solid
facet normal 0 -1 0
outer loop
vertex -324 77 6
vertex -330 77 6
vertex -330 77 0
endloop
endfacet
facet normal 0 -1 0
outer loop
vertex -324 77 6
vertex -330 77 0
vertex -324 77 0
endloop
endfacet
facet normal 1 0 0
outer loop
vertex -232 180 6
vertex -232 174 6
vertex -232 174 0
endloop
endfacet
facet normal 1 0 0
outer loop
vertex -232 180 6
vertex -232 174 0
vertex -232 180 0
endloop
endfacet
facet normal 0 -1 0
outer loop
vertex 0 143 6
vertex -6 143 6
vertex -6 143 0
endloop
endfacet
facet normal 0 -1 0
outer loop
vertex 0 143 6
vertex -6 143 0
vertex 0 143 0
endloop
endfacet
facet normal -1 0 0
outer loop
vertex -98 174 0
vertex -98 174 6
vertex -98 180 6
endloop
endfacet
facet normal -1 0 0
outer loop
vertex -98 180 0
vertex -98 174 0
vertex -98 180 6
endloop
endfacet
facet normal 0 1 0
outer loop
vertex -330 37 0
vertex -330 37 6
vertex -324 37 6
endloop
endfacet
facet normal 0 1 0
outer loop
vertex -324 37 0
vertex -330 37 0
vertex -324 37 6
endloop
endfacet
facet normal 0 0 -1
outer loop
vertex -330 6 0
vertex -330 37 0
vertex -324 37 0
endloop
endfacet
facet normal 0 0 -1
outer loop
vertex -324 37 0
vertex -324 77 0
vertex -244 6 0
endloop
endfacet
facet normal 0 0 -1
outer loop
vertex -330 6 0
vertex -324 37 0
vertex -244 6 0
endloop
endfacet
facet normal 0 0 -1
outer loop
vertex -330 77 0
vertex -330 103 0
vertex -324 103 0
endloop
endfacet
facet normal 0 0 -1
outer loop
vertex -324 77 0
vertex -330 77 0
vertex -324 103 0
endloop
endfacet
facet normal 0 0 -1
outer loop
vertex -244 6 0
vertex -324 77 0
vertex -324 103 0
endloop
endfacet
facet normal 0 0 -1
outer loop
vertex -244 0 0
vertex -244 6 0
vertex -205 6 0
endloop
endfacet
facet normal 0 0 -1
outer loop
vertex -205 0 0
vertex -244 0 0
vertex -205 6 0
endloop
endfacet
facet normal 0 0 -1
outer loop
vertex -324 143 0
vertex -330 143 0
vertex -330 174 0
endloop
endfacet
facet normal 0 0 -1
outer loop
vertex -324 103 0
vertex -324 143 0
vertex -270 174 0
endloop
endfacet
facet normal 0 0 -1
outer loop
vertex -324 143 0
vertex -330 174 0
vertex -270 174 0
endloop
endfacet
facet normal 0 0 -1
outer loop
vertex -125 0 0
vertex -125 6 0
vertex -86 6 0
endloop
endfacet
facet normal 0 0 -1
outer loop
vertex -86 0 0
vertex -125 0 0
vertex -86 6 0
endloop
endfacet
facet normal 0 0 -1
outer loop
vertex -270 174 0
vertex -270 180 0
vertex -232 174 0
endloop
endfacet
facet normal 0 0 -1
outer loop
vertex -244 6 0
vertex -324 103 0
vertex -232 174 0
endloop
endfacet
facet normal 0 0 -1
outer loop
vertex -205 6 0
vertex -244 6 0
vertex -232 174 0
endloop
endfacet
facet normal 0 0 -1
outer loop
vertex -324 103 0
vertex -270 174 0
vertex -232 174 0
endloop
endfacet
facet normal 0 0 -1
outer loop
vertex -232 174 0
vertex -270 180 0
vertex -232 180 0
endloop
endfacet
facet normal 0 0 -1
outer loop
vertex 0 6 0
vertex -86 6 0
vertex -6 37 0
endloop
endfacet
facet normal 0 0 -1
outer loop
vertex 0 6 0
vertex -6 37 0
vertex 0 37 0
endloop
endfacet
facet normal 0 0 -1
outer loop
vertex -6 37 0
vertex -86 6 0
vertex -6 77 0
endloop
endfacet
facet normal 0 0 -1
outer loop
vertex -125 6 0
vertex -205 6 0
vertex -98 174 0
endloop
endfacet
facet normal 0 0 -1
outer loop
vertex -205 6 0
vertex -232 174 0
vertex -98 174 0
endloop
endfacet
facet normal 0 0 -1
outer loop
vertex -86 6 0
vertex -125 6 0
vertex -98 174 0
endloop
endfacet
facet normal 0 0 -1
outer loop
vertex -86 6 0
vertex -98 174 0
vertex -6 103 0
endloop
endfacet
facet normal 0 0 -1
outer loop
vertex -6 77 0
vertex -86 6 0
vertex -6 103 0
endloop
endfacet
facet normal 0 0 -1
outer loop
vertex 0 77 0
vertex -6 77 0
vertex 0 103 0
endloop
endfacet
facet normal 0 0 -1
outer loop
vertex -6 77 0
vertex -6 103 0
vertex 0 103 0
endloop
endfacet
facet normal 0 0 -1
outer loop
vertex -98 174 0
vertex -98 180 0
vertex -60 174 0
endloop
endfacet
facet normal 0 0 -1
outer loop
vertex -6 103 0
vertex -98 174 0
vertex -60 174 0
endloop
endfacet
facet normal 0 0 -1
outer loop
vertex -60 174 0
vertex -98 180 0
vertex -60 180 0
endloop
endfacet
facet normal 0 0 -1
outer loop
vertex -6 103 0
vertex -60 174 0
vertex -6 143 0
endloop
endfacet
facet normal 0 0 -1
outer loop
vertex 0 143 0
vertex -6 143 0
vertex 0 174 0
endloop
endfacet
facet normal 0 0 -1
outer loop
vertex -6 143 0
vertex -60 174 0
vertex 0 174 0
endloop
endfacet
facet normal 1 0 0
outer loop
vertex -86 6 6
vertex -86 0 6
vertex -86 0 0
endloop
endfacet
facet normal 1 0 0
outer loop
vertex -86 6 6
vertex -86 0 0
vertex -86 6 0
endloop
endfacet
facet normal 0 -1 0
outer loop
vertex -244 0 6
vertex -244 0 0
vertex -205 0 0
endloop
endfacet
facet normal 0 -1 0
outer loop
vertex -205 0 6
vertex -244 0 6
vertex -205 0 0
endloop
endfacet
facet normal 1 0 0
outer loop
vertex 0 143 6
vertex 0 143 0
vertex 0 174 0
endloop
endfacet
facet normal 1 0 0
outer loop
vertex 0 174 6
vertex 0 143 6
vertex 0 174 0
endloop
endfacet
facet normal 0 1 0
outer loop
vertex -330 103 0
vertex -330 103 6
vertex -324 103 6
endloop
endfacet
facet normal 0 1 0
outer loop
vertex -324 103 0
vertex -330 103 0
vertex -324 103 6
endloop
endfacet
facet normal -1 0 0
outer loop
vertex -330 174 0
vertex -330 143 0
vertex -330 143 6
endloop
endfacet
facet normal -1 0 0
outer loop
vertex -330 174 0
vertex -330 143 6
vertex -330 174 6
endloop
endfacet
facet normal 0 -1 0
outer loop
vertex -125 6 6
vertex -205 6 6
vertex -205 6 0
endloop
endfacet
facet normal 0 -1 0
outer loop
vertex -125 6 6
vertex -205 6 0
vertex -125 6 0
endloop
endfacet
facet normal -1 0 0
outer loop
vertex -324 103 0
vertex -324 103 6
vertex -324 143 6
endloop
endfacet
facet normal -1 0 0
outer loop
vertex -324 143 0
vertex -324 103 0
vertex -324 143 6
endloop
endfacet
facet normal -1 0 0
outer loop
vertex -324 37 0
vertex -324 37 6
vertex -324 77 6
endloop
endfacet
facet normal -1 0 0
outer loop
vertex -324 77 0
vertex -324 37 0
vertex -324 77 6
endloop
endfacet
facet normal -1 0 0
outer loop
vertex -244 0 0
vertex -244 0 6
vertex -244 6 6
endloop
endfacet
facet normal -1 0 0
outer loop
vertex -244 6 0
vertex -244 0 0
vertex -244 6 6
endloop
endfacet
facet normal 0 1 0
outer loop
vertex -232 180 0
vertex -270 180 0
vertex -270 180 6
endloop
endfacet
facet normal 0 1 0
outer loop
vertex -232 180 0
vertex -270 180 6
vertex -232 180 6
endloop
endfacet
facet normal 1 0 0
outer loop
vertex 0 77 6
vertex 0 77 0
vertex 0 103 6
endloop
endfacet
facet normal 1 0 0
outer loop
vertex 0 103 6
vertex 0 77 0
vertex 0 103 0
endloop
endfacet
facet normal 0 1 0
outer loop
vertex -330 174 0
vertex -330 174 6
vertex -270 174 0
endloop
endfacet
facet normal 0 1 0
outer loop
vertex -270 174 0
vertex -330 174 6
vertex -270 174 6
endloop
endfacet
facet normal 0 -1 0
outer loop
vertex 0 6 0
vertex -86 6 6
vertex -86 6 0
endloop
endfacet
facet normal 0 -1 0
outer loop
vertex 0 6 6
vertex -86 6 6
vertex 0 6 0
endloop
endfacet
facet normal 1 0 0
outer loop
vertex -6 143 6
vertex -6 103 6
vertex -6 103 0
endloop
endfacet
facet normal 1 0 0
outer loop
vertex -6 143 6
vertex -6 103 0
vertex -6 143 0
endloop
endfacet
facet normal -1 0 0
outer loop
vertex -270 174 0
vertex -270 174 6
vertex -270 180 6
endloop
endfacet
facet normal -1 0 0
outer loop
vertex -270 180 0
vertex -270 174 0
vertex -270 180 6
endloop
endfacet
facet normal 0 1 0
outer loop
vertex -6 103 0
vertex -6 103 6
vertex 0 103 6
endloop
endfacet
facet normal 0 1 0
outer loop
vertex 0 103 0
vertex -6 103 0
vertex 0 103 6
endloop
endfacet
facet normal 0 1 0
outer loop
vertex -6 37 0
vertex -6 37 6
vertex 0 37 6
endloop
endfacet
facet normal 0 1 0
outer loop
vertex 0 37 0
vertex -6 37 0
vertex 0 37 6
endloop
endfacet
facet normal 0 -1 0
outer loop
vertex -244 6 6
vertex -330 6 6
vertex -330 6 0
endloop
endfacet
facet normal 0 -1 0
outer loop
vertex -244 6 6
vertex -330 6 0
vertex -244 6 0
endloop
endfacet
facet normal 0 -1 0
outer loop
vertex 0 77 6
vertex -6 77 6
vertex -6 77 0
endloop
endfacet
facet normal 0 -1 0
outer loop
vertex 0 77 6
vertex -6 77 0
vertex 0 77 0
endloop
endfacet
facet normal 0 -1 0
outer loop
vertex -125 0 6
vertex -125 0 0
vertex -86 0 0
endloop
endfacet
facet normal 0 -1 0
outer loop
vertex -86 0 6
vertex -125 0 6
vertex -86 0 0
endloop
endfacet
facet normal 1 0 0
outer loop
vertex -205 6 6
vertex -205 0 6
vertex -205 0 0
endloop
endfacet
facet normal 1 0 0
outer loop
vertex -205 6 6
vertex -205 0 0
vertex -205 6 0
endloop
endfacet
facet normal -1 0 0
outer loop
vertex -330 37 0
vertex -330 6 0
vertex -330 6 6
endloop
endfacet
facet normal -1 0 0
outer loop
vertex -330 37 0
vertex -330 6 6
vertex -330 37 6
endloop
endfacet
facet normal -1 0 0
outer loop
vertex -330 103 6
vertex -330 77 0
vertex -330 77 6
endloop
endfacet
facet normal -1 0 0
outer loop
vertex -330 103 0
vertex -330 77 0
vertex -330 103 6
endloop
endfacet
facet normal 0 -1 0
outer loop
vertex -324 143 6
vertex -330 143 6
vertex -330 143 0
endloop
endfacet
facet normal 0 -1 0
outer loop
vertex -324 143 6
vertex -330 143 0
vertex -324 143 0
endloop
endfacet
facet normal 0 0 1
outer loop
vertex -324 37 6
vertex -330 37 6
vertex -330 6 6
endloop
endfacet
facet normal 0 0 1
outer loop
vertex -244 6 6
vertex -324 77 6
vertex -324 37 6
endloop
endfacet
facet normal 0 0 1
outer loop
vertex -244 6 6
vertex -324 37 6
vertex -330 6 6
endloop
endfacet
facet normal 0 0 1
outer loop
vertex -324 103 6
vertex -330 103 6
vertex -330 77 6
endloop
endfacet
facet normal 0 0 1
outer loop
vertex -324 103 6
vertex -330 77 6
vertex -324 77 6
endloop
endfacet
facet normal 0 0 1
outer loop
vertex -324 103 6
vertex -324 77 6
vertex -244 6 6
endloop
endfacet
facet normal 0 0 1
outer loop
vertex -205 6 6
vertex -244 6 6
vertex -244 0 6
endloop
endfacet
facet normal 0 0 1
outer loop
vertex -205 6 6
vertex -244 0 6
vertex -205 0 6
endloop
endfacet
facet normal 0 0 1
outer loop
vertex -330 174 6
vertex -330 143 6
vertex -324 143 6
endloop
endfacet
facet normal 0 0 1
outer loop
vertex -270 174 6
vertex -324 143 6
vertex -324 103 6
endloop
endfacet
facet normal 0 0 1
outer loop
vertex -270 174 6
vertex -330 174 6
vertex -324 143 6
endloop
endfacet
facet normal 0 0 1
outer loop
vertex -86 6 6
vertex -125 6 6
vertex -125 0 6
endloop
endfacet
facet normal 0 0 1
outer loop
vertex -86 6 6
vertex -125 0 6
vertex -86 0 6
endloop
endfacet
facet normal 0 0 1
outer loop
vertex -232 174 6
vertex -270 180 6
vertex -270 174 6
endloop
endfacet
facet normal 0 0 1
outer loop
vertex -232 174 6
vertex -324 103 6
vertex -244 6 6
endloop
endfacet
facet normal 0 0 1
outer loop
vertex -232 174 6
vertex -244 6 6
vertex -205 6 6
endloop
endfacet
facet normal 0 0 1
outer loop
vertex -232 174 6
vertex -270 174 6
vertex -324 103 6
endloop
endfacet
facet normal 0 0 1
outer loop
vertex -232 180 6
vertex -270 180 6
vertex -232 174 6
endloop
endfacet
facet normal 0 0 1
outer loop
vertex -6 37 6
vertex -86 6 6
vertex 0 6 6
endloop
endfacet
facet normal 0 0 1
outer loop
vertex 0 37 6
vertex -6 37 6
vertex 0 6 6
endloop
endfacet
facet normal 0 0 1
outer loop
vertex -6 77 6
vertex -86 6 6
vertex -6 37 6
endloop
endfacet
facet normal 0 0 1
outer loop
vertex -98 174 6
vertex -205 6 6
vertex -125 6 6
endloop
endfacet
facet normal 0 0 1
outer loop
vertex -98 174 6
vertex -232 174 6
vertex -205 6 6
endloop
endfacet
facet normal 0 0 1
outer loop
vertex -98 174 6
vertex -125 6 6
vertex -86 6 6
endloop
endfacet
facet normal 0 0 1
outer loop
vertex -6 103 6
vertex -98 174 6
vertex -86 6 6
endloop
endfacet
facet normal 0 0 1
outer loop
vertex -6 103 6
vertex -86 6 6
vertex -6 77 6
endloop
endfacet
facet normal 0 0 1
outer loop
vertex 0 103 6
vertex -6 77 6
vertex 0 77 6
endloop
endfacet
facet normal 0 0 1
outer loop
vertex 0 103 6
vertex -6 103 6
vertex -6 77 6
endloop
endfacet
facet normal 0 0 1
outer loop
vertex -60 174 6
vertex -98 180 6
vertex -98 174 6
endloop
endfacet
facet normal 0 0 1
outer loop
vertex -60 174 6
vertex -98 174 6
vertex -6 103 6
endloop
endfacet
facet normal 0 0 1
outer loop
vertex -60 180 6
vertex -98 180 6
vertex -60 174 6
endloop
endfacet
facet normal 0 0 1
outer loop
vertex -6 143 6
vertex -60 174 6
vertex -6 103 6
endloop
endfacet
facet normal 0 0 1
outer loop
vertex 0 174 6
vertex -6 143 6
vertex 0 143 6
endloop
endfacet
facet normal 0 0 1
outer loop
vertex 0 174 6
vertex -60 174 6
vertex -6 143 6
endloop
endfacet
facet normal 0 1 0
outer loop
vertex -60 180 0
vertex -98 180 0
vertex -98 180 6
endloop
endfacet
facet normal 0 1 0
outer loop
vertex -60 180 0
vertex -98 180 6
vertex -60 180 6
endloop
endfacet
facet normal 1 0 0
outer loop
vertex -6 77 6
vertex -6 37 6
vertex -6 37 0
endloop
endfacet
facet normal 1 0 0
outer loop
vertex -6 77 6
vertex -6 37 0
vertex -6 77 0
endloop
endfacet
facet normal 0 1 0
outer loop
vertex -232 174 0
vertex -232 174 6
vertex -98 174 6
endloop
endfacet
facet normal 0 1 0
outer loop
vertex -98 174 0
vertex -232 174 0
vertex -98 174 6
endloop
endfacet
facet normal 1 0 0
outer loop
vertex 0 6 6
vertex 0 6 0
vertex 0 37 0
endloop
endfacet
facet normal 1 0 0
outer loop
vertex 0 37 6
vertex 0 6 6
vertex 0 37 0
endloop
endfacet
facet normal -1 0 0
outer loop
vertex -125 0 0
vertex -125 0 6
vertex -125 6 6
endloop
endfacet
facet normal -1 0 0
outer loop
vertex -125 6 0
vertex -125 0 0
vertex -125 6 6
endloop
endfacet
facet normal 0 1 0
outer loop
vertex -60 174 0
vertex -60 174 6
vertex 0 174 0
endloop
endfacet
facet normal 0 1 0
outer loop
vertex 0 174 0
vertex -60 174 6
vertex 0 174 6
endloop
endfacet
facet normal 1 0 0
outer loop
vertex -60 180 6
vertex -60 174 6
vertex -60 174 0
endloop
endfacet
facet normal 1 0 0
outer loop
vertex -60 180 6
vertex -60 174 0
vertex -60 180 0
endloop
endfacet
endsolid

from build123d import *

# Parameters (mm, degrees)
ESQUISSE1_W             = 330
ESQUISSE1_H             = 180
BOSS_EXTRU_1_DEPTH      = 6
ESQUISSE2_W             = 60
ESQUISSE2_H             = 6
ESQUISSE2_W_2           = 134
ESQUISSE2_W_3           = 6
ESQUISSE2_H_2           = 40
ESQUISSE2_W_4           = 86
ESQUISSE2_W_5           = 80
ENL_V_MAT_ENCOCHE_DEPTH = 376.946804748


with BuildPart() as part:
    # Esquisse1 → Boss.-Extru.1 (new body)
    with BuildSketch(Plane.XY):
        with Locations((-165, 90)):
            Rectangle(ESQUISSE1_W, ESQUISSE1_H)
    extrude(amount=BOSS_EXTRU_1_DEPTH)

    # Esquisse2 → Enlèv. mat encoche (cut, through all)
    with BuildSketch(Plane.XY.offset(6)):
        with Locations((-300, 177)):
            Rectangle(ESQUISSE2_W, ESQUISSE2_H)
        with Locations((-165, 177)):
            Rectangle(ESQUISSE2_W_2, ESQUISSE2_H)
        with Locations((-30, 177)):
            Rectangle(ESQUISSE2_W, ESQUISSE2_H)
        with Locations((-327, 123)):
            Rectangle(ESQUISSE2_W_3, ESQUISSE2_H_2)
        with Locations((-327, 57)):
            Rectangle(ESQUISSE2_W_3, ESQUISSE2_H_2)
        with Locations((-3, 123)):
            Rectangle(ESQUISSE2_W_3, ESQUISSE2_H_2)
        with Locations((-3, 57)):
            Rectangle(ESQUISSE2_W_3, ESQUISSE2_H_2)
        with Locations((-287, 3)):
            Rectangle(ESQUISSE2_W_4, ESQUISSE2_H)
        with Locations((-165, 3)):
            Rectangle(ESQUISSE2_W_5, ESQUISSE2_H)
        with Locations((-43, 3)):
            Rectangle(ESQUISSE2_W_4, ESQUISSE2_H)
    extrude(amount=-ENL_V_MAT_ENCOCHE_DEPTH, mode=Mode.SUBTRACT)


solid = part.part
